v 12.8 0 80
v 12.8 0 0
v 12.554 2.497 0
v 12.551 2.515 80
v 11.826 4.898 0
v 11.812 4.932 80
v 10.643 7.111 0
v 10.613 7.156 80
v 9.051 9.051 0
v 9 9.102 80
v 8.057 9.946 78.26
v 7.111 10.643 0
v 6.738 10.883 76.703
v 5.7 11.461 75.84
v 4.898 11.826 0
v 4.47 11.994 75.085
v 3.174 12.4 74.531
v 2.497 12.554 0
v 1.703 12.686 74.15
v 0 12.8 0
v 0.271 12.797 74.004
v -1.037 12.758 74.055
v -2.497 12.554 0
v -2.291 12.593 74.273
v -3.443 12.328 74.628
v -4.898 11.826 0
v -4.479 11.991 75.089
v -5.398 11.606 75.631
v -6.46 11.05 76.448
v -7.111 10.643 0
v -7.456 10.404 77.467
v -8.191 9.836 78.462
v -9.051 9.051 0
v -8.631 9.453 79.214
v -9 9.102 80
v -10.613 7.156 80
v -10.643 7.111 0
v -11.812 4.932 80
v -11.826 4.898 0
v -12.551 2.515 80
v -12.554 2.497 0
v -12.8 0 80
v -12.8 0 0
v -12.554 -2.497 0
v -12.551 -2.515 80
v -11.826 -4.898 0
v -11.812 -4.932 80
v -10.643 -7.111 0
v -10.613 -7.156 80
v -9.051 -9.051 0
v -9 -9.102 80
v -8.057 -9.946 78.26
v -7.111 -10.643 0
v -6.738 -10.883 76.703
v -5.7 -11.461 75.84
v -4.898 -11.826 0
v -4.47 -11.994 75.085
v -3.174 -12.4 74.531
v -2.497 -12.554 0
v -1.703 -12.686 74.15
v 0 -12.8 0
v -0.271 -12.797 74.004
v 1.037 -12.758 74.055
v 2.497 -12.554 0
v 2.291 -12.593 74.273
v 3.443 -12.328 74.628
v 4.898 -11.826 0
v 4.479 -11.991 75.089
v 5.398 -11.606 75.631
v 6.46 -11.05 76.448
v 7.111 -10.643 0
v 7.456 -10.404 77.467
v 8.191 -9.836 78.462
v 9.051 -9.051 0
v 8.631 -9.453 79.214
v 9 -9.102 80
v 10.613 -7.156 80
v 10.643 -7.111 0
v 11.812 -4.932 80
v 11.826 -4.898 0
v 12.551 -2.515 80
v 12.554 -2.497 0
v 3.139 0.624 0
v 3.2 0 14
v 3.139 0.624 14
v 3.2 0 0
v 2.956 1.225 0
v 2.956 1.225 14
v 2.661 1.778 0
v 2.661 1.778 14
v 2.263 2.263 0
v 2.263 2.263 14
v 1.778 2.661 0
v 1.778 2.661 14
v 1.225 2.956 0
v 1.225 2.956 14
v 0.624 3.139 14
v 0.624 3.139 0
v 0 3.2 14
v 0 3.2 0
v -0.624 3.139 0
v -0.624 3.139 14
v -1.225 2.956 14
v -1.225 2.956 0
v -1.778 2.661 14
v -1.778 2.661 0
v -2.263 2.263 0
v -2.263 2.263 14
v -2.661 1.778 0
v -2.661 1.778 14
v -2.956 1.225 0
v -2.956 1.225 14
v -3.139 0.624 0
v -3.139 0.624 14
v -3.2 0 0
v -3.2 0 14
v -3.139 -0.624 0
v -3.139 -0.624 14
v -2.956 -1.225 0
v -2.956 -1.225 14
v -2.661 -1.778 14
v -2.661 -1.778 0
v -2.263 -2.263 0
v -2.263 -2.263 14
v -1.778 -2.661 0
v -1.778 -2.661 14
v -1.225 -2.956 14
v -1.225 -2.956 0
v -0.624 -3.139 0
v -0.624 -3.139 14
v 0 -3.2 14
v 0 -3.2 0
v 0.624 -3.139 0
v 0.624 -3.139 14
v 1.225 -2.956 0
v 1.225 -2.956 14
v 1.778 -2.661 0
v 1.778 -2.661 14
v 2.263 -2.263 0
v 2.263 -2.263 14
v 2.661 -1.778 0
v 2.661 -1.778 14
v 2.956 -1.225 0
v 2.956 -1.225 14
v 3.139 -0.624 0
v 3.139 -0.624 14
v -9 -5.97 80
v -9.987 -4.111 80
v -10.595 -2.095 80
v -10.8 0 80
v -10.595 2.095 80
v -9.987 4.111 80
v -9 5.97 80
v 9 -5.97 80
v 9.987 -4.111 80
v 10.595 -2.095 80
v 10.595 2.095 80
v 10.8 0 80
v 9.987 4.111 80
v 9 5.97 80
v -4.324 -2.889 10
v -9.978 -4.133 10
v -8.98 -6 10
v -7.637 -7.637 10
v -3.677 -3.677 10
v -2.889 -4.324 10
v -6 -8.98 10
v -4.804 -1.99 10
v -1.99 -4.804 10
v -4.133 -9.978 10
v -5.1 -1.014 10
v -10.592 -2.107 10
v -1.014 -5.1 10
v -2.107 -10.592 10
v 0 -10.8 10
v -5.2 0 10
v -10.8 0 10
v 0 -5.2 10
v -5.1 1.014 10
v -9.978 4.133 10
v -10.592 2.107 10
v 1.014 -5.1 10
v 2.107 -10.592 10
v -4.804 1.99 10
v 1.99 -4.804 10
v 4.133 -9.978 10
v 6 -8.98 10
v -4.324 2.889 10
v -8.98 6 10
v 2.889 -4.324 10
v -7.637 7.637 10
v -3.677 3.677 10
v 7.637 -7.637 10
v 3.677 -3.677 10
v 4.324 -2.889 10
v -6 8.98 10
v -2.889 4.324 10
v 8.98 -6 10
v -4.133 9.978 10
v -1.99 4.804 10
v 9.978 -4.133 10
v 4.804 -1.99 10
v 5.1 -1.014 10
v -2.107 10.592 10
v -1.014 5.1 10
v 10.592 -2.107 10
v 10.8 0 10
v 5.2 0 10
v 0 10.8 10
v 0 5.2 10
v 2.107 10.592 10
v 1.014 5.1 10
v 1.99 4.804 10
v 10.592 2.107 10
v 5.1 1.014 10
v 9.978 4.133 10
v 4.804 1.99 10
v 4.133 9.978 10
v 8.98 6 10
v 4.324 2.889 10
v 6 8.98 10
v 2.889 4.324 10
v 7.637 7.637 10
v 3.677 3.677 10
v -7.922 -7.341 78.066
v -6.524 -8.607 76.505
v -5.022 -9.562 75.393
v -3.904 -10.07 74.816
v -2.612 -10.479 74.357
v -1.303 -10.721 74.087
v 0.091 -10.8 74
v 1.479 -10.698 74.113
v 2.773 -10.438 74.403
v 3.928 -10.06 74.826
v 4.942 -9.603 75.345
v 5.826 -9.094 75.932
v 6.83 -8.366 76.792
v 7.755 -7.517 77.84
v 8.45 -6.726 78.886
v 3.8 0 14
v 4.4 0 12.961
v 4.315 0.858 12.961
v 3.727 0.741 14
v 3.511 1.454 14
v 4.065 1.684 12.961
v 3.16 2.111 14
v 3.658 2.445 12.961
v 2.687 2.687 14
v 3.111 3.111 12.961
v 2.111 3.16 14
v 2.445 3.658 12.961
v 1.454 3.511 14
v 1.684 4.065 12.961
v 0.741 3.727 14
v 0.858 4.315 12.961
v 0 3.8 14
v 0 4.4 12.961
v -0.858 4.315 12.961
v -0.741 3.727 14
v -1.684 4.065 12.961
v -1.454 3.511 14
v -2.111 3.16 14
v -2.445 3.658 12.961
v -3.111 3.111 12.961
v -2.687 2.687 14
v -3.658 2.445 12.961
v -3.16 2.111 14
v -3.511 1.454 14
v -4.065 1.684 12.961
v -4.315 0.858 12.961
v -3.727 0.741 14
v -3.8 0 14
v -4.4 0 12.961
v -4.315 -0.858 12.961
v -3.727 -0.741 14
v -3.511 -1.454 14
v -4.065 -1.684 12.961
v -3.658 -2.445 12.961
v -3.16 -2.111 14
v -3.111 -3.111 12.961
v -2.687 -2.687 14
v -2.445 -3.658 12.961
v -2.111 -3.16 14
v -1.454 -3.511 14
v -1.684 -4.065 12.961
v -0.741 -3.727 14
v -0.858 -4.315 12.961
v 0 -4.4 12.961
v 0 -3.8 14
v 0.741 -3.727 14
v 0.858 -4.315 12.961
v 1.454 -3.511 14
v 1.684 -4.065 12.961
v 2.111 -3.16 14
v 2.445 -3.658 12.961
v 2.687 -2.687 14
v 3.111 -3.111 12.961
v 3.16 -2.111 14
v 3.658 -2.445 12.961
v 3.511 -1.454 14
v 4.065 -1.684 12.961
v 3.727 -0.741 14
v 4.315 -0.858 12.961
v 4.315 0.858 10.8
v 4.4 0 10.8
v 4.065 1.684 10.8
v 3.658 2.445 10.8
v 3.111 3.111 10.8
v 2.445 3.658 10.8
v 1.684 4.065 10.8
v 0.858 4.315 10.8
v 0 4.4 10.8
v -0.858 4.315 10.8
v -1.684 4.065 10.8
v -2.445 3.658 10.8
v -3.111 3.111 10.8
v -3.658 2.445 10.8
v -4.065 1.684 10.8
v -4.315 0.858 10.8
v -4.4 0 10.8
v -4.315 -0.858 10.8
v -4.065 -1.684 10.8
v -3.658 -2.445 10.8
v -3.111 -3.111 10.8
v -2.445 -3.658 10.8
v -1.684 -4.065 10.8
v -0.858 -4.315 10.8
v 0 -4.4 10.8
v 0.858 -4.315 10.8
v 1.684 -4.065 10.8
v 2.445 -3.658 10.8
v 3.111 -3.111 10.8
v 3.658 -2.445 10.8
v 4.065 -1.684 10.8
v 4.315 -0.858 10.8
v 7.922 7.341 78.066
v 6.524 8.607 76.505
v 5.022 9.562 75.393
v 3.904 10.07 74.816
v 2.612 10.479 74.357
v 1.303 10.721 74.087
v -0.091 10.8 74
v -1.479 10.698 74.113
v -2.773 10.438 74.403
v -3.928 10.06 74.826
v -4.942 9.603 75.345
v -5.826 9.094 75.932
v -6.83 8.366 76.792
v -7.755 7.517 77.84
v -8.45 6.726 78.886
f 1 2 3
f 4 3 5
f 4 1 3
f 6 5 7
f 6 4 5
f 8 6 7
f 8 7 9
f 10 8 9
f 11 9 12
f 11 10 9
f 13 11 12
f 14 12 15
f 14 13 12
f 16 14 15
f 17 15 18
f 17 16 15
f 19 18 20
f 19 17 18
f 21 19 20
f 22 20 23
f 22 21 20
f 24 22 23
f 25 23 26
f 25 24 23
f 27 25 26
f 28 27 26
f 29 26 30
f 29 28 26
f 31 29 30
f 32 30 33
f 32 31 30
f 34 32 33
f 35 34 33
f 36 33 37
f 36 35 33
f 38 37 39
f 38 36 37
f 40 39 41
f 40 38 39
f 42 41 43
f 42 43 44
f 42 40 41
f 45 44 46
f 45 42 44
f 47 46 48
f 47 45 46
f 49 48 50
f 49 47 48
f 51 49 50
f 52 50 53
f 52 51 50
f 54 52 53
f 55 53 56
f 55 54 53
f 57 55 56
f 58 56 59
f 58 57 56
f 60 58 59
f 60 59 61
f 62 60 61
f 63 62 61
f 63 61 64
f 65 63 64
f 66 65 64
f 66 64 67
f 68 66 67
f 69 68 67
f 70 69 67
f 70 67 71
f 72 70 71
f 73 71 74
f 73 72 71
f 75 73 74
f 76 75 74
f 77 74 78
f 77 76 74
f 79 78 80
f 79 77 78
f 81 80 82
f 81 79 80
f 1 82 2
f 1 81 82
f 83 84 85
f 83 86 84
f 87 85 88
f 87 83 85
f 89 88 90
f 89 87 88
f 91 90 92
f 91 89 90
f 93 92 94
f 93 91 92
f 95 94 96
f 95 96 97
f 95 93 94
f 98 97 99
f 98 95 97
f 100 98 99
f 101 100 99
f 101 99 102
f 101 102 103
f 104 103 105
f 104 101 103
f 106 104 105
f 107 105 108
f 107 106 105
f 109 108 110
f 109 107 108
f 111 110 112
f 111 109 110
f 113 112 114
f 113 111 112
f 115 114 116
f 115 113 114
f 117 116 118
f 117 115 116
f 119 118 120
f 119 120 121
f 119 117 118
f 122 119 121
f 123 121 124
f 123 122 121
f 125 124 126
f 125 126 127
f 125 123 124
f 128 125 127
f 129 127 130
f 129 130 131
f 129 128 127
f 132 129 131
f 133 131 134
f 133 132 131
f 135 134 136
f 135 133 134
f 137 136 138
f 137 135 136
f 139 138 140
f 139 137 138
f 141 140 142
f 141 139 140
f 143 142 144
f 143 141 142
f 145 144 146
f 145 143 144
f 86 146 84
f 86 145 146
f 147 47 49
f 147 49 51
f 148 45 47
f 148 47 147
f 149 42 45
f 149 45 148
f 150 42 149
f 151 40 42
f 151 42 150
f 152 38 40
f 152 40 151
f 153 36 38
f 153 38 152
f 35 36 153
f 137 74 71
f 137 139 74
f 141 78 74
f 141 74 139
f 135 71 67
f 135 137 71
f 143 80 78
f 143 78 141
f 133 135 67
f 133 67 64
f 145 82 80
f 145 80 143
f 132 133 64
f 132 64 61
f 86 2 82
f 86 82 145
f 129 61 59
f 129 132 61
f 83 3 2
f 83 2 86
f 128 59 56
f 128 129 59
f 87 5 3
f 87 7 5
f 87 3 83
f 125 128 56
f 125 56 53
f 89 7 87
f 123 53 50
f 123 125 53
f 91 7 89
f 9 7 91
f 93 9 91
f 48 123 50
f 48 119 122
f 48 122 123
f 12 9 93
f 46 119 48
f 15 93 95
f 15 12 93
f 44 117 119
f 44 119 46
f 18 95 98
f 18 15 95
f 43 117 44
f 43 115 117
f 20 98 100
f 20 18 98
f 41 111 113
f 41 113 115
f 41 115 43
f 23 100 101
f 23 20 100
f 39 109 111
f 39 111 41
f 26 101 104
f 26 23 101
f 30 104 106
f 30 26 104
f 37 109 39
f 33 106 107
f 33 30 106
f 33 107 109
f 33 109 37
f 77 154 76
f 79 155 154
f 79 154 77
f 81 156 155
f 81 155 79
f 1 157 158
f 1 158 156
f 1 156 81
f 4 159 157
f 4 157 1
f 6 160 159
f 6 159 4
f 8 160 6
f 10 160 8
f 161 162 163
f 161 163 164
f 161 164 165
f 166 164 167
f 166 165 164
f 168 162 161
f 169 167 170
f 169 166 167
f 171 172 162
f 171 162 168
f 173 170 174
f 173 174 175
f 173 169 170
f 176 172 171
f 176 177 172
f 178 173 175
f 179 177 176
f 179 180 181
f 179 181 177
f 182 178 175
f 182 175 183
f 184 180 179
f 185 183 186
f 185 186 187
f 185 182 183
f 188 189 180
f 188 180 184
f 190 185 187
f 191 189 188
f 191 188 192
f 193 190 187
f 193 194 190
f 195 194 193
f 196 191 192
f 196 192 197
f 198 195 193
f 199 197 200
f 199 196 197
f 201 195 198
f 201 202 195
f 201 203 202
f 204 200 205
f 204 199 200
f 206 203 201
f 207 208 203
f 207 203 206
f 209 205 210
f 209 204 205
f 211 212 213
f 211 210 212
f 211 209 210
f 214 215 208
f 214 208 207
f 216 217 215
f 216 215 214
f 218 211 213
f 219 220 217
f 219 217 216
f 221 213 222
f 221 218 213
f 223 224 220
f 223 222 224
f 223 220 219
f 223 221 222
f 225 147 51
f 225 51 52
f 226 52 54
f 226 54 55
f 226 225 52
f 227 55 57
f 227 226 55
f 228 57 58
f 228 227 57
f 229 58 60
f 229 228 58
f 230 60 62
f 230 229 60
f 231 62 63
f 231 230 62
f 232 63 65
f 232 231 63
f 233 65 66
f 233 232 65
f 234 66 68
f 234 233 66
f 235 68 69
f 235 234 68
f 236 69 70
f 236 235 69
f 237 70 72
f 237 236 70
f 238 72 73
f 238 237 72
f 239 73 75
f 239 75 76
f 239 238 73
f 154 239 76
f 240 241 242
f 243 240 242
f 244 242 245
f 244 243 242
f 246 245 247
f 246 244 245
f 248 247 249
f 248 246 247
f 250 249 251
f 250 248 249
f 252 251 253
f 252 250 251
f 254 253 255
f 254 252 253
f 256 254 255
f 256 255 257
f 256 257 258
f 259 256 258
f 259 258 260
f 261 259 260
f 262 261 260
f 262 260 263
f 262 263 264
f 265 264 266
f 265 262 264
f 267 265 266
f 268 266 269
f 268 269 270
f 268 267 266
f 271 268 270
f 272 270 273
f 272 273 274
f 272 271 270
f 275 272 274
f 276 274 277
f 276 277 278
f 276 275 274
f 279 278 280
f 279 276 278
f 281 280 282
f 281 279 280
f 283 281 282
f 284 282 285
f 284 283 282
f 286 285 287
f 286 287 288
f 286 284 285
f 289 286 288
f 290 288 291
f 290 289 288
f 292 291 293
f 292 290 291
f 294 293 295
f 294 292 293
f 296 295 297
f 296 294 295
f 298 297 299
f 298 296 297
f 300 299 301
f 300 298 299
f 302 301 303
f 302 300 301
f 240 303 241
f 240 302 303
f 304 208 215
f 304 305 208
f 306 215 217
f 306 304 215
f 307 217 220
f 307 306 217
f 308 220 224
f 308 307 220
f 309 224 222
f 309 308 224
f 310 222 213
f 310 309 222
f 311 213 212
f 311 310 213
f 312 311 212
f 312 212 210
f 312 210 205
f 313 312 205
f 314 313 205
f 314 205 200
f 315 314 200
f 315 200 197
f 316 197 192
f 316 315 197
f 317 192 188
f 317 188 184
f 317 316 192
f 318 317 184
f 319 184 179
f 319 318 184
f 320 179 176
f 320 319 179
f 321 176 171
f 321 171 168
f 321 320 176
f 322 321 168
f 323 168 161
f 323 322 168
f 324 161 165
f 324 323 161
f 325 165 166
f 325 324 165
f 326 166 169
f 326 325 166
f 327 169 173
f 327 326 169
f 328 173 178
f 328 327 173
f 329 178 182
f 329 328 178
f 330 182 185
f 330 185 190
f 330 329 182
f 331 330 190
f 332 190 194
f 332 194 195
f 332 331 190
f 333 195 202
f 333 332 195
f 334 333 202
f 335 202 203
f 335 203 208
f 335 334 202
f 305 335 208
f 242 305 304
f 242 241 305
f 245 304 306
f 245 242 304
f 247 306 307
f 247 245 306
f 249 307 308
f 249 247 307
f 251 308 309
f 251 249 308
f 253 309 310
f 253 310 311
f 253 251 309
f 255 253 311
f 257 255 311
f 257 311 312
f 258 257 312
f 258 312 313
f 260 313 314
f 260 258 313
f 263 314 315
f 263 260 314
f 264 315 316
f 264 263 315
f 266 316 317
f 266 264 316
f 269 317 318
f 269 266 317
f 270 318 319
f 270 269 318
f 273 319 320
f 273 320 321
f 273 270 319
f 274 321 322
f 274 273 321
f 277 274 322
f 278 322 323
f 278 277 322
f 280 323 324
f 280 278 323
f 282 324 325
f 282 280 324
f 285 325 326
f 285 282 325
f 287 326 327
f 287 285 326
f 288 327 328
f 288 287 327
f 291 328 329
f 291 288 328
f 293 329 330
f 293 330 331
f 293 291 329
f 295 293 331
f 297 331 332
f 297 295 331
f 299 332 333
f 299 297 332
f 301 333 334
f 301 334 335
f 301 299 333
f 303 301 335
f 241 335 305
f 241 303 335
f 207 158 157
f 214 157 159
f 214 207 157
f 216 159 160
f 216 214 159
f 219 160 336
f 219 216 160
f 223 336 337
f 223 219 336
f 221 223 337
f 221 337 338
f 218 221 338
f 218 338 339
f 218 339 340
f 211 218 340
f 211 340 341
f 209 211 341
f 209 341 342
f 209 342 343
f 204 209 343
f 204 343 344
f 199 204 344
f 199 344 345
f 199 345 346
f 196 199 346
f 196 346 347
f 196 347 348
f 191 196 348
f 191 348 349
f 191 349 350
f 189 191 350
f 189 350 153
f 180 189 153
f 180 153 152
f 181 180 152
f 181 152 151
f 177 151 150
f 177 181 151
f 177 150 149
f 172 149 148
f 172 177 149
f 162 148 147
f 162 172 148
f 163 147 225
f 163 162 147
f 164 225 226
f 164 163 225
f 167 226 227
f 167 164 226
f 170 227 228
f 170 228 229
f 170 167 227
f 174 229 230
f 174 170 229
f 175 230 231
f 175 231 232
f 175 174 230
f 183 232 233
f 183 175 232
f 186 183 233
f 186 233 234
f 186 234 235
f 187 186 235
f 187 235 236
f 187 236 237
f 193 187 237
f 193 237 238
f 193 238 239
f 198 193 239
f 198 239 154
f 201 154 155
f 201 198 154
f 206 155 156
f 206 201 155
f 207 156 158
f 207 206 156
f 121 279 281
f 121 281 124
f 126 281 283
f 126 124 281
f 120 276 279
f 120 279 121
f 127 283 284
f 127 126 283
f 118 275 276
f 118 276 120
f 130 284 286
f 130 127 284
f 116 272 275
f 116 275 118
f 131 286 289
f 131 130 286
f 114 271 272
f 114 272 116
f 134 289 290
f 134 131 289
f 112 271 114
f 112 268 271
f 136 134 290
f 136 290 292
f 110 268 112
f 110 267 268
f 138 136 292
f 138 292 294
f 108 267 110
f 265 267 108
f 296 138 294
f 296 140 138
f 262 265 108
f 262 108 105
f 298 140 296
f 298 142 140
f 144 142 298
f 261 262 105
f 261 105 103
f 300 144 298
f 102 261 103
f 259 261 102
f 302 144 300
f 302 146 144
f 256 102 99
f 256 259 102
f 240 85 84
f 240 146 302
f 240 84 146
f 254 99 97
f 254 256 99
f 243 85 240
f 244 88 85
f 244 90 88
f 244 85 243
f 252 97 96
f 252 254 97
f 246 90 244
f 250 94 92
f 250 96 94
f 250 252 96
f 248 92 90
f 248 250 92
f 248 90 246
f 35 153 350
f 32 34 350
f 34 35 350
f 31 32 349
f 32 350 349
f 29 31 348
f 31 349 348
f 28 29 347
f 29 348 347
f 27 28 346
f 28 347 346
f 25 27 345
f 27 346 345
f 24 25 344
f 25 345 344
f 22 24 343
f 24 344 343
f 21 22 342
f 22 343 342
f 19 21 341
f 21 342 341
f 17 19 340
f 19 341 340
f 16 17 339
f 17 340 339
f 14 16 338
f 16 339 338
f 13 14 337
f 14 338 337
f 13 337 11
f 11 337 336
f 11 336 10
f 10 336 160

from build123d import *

# Parameters (mm, degrees)
F3_DEPTH      = 12.801
F3_DEPTH_BACK = 12.801


with BuildPart() as f1:
    # F0 (on Front) → F1 (revolve)
    with BuildSketch(Plane.XZ):
        Polygon((3.2, 0), (12.8, 0), (12.8, 80), (10.8, 80), (10.8, 10), (5.2, 10), (4.4, 10.8), (4.4, 12.9607695155), (3.8, 14), (3.2, 14), align=None)
    revolve(axis=Axis((0, 0, 37.0239801705), (0, 0, 1)))

    # F2 (on Front) → F3 (cut, two sides)
    with BuildSketch(Plane.XZ) as f3_sk:
        with BuildLine():
            Line((9, 80), (-9, 80))
            ThreePointArc((-9, 80), (0, 74), (9, 80))
        make_face()
    extrude(amount=-F3_DEPTH, mode=Mode.SUBTRACT)
    extrude(f3_sk.sketch, amount=F3_DEPTH_BACK, mode=Mode.SUBTRACT)


solid = f1.part
